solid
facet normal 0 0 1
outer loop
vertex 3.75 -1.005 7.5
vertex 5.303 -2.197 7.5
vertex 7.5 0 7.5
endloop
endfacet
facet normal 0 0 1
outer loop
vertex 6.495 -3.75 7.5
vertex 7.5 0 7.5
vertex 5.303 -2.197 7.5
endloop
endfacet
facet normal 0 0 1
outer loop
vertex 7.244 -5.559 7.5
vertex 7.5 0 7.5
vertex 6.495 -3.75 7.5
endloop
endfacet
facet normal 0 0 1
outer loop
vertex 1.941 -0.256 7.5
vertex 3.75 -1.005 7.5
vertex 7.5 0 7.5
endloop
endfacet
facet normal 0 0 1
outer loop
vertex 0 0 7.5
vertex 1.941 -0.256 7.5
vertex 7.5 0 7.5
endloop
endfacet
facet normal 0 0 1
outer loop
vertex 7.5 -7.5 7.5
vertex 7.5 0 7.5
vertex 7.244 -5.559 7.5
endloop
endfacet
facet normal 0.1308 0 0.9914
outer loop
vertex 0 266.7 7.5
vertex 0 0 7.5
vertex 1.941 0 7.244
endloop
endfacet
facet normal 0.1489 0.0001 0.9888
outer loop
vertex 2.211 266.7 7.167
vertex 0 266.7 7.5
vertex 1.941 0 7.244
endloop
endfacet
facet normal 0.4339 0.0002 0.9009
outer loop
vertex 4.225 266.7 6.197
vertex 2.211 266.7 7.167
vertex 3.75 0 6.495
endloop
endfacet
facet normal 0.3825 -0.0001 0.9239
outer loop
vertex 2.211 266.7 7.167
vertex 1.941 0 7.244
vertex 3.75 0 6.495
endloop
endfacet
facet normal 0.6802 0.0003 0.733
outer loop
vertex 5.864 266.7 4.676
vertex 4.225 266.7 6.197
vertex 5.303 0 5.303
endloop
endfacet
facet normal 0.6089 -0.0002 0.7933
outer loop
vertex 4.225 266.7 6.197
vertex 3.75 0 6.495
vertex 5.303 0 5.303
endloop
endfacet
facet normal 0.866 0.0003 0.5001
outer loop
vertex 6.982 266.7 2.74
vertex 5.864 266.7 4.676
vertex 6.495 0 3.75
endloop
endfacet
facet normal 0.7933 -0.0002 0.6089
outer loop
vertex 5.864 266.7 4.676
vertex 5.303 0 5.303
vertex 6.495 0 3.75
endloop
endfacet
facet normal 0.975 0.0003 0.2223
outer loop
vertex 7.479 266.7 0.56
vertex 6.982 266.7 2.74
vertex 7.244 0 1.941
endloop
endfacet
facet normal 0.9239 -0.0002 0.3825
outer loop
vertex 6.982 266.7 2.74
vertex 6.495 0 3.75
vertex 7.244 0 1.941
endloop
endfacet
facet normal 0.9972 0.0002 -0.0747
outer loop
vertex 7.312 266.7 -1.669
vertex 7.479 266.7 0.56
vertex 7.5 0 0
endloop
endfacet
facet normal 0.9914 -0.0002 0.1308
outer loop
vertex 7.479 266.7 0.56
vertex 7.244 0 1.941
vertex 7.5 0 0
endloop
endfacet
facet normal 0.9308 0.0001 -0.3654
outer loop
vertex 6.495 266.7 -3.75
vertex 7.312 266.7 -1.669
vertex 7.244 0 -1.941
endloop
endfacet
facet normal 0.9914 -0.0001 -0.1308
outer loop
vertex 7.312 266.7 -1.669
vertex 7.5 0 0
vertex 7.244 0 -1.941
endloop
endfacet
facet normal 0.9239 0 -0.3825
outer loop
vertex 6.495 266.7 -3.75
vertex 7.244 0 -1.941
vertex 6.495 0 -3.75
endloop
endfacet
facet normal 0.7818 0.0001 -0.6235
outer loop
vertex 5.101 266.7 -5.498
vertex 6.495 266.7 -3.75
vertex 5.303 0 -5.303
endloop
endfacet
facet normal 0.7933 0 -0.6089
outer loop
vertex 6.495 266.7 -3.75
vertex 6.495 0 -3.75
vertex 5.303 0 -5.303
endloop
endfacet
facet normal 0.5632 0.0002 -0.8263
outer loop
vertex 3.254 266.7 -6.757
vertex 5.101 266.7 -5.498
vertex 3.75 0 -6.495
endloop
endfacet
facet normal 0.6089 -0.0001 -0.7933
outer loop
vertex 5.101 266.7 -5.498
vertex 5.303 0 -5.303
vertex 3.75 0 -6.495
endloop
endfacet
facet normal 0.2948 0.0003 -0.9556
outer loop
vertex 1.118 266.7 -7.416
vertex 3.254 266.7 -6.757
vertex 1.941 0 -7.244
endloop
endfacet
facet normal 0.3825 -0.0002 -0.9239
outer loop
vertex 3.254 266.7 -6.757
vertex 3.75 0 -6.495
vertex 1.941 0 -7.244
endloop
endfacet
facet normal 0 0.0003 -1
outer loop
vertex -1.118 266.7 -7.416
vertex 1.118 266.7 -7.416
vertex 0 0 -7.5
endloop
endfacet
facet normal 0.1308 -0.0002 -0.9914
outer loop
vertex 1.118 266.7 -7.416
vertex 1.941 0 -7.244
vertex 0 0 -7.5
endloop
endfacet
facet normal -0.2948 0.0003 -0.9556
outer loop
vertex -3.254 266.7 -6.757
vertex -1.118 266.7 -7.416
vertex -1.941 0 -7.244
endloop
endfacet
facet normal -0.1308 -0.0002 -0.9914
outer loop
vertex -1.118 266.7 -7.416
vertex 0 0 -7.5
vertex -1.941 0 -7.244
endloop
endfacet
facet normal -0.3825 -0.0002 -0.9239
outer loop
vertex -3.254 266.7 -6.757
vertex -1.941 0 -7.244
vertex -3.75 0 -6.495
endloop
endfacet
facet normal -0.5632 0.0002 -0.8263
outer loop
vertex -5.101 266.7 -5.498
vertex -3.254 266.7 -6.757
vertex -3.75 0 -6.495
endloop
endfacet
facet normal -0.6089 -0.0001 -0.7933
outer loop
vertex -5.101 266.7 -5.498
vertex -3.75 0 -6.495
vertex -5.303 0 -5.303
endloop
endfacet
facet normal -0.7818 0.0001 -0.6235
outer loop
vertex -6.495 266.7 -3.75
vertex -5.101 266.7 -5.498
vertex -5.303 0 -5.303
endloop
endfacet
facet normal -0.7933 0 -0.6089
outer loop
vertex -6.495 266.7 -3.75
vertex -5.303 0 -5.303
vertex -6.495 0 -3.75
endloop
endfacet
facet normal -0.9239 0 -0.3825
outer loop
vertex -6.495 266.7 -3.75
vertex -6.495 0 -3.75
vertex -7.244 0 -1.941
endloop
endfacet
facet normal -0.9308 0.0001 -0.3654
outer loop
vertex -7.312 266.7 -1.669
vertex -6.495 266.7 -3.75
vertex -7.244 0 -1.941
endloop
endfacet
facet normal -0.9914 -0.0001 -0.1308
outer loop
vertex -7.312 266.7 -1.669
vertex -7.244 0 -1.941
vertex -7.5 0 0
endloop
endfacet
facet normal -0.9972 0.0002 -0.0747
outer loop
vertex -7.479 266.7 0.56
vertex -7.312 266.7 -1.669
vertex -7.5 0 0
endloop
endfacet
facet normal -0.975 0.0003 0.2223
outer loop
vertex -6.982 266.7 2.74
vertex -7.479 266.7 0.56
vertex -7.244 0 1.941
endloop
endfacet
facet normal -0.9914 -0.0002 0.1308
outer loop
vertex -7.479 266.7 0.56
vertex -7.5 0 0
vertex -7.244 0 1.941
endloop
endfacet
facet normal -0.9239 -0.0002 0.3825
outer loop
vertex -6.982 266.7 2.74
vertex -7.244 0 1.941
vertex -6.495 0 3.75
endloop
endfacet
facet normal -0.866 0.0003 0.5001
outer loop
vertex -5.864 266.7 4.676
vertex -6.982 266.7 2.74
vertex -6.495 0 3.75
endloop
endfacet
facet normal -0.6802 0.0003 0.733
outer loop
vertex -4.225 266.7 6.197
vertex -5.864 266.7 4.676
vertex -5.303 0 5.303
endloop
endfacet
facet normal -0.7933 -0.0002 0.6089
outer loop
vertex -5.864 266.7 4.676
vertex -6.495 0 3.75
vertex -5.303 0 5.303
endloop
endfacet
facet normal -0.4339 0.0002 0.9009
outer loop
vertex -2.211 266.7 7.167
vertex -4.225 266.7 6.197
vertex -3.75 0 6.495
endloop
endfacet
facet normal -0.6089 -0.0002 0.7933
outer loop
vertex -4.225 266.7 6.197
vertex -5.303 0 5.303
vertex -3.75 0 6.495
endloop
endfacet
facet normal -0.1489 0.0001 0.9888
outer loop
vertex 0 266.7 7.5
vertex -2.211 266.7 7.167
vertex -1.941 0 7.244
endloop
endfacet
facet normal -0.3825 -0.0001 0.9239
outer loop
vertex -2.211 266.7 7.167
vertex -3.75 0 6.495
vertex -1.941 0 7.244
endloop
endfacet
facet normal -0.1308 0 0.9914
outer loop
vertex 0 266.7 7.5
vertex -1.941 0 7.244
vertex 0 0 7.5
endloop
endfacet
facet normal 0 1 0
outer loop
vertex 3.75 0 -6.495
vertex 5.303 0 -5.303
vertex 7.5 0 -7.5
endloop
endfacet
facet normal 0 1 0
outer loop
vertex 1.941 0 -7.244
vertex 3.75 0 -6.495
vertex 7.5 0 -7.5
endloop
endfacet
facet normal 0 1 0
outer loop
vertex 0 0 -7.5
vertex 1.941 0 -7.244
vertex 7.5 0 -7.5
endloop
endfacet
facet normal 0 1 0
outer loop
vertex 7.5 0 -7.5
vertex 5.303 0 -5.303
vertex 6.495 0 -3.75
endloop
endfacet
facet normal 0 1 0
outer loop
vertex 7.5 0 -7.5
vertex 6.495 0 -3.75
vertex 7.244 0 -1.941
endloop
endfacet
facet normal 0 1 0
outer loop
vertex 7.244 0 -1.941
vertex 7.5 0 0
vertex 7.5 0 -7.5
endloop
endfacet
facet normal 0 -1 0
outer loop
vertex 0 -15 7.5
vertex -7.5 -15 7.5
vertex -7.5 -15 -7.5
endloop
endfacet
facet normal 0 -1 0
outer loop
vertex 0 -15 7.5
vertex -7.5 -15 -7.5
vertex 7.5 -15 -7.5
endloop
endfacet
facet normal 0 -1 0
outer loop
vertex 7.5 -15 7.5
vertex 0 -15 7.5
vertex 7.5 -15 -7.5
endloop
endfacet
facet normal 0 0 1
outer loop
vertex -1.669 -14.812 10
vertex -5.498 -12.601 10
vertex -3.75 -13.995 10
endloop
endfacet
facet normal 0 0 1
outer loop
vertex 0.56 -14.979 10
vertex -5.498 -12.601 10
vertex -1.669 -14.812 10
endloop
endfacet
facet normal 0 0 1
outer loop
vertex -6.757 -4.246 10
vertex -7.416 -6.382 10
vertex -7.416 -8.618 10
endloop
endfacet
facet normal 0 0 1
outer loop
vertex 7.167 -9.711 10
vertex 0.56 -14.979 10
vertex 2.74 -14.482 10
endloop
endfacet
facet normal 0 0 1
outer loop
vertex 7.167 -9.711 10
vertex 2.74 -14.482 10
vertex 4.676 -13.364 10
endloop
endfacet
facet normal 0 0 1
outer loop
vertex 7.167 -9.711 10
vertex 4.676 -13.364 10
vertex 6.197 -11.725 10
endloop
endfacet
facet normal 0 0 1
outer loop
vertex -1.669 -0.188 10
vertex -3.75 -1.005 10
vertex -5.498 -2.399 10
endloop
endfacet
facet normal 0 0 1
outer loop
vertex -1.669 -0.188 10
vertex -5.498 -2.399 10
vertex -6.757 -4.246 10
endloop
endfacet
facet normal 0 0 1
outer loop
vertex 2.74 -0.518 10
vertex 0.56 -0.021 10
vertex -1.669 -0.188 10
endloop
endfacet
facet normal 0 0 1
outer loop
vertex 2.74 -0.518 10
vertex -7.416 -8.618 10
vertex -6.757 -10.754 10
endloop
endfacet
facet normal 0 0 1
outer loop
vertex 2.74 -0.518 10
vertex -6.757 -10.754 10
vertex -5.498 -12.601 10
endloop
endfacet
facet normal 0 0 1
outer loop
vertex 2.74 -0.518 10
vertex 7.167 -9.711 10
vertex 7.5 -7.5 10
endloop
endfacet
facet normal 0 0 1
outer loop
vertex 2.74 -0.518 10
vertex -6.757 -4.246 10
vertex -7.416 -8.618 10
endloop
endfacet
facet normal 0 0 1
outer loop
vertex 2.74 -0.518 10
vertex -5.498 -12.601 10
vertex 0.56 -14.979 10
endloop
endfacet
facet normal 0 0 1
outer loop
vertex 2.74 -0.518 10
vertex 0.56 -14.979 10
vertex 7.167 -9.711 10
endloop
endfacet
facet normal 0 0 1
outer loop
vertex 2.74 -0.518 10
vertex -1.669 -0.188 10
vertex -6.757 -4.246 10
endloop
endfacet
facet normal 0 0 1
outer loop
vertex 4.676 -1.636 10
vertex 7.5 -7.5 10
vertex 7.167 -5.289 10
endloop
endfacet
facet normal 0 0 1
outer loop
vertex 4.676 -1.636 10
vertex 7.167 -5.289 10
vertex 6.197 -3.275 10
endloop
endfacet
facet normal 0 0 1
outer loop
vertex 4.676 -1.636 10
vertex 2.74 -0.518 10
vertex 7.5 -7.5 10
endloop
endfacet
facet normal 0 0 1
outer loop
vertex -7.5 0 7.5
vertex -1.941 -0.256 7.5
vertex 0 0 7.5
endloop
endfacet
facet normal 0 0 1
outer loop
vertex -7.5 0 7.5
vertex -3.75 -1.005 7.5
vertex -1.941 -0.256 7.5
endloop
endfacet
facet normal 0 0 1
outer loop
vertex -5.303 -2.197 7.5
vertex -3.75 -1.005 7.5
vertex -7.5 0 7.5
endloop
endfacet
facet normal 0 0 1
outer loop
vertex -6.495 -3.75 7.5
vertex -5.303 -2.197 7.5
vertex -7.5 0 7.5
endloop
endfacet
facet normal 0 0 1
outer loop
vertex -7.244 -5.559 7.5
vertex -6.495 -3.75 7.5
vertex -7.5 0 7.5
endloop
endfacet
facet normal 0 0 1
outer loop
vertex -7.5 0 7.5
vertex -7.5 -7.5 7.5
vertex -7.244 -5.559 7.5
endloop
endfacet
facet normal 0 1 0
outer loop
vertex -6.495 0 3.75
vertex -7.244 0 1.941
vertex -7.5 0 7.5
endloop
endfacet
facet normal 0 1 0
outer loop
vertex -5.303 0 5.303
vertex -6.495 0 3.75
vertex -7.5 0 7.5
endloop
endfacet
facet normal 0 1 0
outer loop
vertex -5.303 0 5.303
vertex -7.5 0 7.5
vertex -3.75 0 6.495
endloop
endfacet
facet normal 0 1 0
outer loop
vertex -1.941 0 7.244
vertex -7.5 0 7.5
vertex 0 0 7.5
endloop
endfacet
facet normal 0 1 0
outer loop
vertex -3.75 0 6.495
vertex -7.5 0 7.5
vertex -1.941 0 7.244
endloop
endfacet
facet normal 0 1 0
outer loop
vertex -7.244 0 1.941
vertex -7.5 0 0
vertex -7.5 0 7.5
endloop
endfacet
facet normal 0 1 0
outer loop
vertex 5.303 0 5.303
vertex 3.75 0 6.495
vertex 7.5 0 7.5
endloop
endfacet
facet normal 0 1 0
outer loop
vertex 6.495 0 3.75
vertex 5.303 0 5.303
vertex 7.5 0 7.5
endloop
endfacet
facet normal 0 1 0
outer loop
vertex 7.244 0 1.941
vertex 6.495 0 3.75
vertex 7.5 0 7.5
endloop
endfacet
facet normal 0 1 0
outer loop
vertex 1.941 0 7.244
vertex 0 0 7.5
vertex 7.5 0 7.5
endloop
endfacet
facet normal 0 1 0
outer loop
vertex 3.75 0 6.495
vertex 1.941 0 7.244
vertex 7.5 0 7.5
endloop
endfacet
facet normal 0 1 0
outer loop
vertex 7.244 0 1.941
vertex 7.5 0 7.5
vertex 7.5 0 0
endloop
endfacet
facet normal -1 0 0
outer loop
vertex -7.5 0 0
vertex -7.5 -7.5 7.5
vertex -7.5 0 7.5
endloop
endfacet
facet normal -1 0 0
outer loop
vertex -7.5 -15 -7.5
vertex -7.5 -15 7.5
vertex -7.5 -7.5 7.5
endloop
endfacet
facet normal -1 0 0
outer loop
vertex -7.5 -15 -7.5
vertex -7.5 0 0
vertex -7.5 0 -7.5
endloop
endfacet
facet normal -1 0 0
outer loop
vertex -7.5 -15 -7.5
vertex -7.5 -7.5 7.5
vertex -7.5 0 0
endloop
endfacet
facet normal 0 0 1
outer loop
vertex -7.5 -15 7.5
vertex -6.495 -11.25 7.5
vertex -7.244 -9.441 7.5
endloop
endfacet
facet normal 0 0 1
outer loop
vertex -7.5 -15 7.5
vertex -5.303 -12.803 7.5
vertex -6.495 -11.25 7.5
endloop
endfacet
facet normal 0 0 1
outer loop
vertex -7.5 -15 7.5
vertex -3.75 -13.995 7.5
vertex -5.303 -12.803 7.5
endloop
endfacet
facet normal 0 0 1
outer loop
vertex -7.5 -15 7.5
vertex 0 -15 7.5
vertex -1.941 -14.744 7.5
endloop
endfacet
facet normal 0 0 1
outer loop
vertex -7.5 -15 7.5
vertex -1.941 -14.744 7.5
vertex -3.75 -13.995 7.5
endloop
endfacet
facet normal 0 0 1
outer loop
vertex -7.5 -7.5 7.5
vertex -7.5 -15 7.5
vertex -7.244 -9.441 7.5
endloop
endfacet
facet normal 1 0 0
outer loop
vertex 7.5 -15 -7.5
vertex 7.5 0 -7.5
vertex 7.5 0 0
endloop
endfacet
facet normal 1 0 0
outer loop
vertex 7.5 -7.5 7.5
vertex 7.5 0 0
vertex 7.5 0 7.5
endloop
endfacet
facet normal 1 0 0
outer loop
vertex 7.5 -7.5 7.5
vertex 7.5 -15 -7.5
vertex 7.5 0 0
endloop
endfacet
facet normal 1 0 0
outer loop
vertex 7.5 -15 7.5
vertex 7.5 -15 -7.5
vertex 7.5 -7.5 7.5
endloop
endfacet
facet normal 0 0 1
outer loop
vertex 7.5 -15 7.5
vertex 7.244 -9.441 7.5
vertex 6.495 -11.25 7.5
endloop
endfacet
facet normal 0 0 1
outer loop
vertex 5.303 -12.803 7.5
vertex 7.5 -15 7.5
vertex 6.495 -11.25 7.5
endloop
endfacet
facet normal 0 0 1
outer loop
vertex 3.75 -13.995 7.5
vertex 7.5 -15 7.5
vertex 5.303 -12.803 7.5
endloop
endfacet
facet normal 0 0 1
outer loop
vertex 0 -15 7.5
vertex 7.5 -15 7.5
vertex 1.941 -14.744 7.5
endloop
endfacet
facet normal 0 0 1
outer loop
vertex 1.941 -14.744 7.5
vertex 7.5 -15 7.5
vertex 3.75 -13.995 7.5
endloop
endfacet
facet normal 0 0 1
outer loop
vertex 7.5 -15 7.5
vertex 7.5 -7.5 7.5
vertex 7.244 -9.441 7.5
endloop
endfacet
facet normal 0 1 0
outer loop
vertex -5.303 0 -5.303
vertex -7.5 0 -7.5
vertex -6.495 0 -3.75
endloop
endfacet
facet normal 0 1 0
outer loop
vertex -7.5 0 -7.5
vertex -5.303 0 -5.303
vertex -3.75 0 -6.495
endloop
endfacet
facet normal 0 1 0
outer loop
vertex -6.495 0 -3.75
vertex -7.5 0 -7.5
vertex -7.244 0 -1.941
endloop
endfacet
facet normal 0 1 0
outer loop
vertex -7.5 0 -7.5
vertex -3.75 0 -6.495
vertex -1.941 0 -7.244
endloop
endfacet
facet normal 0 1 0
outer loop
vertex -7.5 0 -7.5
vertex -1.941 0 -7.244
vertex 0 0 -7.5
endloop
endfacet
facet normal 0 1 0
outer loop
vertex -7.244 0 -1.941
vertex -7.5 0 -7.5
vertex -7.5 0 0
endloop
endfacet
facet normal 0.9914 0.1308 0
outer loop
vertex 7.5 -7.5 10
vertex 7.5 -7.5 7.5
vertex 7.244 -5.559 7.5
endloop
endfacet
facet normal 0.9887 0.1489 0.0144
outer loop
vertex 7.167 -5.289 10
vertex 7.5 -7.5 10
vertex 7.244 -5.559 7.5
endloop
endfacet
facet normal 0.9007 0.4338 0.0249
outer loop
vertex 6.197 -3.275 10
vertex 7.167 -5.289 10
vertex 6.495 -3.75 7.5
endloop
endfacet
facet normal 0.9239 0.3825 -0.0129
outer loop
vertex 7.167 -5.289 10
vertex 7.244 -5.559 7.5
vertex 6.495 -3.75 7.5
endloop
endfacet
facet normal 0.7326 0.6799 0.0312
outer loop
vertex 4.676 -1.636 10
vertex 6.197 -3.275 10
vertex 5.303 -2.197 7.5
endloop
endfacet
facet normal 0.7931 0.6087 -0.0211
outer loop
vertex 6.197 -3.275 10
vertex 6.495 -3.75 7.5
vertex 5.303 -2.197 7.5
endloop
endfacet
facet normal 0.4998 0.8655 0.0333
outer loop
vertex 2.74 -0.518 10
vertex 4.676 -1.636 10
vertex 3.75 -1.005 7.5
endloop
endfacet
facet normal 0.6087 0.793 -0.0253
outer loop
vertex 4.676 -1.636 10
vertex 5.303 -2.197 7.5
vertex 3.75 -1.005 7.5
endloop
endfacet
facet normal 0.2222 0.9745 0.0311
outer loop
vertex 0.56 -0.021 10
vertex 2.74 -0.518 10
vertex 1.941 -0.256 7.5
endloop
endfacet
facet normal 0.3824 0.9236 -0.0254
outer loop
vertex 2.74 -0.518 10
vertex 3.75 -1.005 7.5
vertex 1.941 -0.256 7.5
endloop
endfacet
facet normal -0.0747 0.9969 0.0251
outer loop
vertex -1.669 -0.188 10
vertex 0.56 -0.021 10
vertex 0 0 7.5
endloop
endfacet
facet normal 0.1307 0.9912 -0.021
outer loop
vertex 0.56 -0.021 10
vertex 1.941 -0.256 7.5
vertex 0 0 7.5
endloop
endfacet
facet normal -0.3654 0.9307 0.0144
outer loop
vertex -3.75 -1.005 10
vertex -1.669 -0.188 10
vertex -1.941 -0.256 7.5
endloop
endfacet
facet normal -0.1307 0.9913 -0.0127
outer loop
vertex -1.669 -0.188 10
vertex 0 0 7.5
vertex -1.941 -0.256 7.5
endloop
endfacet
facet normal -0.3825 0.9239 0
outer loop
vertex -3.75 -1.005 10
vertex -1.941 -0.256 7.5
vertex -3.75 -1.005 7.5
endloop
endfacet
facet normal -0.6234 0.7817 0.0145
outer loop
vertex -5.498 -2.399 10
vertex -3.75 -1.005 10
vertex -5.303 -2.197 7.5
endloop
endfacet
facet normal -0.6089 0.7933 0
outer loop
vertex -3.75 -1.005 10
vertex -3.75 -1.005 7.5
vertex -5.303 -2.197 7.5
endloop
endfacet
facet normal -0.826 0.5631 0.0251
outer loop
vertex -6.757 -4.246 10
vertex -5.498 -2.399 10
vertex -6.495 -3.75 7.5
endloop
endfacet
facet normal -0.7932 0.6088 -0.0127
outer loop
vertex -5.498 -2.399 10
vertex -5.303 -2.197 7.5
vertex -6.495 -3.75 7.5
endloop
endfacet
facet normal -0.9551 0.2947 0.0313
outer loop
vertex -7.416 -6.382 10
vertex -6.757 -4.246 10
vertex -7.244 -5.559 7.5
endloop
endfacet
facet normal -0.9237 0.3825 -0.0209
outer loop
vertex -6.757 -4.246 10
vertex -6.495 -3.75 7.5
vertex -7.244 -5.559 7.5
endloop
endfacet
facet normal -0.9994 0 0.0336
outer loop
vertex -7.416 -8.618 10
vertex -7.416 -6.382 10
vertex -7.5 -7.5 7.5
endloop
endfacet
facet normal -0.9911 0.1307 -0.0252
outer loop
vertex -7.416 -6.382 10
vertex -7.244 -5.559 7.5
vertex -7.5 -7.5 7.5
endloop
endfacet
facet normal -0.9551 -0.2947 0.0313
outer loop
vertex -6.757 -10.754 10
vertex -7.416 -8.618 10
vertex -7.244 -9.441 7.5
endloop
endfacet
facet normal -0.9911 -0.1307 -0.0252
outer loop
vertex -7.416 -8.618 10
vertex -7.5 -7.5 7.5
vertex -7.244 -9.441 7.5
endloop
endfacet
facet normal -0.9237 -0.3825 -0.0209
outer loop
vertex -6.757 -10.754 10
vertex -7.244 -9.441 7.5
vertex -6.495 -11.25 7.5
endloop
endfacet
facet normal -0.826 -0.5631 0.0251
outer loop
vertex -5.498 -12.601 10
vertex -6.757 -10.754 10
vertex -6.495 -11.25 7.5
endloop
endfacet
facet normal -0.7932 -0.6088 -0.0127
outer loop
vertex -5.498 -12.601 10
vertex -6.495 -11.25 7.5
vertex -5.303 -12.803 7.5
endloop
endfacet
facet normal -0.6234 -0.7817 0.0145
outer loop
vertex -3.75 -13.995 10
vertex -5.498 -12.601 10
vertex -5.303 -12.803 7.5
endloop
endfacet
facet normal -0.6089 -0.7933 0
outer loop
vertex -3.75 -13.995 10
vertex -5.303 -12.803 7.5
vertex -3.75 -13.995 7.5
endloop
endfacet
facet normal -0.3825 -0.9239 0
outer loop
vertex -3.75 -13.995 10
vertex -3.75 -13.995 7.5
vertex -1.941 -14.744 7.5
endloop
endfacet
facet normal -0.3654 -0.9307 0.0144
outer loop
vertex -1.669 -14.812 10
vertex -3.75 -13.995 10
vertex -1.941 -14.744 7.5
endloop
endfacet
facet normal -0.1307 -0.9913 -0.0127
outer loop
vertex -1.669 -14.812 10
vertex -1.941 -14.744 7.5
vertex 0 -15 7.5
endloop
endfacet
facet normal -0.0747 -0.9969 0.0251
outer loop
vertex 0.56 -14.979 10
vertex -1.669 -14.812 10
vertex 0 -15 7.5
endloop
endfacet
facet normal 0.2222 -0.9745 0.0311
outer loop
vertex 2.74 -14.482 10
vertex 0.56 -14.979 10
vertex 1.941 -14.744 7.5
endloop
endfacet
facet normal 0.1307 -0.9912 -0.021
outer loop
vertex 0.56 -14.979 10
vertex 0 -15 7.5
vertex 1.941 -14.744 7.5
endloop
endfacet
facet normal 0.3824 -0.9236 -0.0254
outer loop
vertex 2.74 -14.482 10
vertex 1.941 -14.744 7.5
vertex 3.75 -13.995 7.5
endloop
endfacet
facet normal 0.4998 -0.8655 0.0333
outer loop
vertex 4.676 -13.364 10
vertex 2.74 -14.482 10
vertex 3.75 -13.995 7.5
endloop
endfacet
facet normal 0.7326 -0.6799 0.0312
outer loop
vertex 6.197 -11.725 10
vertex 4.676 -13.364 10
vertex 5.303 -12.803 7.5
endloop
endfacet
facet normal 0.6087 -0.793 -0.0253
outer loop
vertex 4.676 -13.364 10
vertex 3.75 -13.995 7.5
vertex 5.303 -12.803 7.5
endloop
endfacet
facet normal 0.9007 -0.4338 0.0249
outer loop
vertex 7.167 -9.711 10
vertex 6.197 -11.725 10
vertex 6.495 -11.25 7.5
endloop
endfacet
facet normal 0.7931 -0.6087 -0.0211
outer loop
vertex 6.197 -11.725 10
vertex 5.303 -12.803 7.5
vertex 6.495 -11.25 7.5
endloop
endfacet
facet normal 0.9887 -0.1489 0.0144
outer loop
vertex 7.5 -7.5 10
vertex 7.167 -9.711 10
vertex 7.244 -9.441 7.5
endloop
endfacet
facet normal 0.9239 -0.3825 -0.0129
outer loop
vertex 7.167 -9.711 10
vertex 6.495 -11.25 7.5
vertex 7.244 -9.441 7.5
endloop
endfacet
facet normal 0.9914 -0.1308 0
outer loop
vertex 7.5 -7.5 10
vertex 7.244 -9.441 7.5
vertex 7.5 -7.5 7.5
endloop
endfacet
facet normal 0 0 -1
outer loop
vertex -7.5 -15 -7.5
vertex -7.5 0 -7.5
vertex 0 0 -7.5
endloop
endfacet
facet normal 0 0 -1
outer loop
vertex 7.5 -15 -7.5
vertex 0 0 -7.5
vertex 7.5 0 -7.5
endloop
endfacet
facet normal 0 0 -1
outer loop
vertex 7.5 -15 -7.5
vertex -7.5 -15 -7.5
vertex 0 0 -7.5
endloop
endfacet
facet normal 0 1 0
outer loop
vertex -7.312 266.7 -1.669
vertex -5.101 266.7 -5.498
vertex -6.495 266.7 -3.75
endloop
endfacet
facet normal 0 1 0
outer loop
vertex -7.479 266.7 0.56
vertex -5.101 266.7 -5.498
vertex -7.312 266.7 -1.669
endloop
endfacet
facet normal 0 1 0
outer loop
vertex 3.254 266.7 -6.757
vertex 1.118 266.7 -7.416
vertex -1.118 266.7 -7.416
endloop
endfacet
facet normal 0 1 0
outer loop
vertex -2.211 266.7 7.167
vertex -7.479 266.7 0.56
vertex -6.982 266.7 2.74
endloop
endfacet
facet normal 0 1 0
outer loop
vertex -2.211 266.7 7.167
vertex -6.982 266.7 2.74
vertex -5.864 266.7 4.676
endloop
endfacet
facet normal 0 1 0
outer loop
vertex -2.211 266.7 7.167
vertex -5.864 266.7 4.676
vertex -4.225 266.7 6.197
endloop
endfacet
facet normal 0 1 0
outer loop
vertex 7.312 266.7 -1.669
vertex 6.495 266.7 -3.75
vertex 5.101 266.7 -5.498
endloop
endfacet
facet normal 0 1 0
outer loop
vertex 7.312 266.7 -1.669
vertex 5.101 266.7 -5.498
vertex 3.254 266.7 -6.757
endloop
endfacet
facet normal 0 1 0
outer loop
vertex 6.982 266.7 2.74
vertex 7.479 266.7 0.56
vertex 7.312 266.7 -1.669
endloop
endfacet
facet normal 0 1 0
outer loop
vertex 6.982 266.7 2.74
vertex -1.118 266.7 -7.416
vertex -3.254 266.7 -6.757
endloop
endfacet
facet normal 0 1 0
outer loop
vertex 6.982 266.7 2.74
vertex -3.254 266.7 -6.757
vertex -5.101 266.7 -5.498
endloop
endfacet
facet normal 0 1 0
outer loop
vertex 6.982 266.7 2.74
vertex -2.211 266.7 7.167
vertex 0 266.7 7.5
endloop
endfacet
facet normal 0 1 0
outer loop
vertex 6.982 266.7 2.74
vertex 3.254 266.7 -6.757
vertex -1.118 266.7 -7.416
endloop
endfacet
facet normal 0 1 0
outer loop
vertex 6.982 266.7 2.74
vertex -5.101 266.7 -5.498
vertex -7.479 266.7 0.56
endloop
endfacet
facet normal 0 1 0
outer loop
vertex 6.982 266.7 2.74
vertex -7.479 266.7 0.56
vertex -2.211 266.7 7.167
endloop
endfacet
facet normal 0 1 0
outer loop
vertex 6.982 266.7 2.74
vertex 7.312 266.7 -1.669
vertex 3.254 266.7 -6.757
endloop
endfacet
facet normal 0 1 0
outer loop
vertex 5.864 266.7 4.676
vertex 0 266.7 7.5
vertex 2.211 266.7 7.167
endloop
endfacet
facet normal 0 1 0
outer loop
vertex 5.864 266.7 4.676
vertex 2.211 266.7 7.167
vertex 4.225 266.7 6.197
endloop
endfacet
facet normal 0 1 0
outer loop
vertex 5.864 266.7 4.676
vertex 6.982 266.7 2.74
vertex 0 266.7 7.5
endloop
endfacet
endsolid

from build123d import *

# Parameters (mm, degrees)
SKETCH1_R           = 7.5
BOSS_EXTRUDE1_DEPTH = 266.7
BOSS_EXTRUDE2_START = 15
SKETCH2_R           = 7.5
BOSS_EXTRUDE2_DEPTH = 15
SKETCH3_R           = 7.5
BOSS_EXTRUDE3_DEPTH = 2.5


with BuildPart() as part:
    # Sketch1 → Boss-Extrude1 (new body)
    with BuildSketch(Plane(origin=(0, 0, 0), x_dir=(1, 0, 0), z_dir=(0, 1, 0))):
        with Locations(Location((0, 0, 0), (0, 0, 270))):
            Circle(SKETCH1_R)
    extrude(amount=BOSS_EXTRUDE1_DEPTH)

    # Sketch2 → Boss-Extrude2 (add)
    with BuildSketch(Plane.XZ.offset(BOSS_EXTRUDE2_START)):
        with BuildLine():
            Line((0, 7.5), (-7.5, 7.5))
            Line((-7.5, 7.5), (-7.5, 0))
            ThreePointArc((-7.5, 0), (-5.303300859, 5.303300859), (0, 7.5))
        make_face()
        with Locations(Location((0, 0, 0), (0, 0, 90))):
            Circle(SKETCH2_R)
        with BuildLine():
            Line((7.5, 7.5), (0, 7.5))
            ThreePointArc((0, 7.5), (5.303300859, 5.303300859), (7.5, 0))
            Line((7.5, 0), (7.5, 7.5))
        make_face()
        with BuildLine():
            Line((7.5, -7.5), (7.5, 0))
            ThreePointArc((7.5, 0), (5.303300859, -5.303300859), (0, -7.5))
            Line((0, -7.5), (7.5, -7.5))
        make_face()
        with BuildLine():
            ThreePointArc((0, -7.5), (-5.303300859, -5.303300859), (-7.5, 0))
            Line((-7.5, 0), (-7.5, -7.5))
            Line((-7.5, -7.5), (0, -7.5))
        make_face()
    extrude(amount=-BOSS_EXTRUDE2_DEPTH)

    # Sketch3 → Boss-Extrude3 (add)
    with BuildSketch(Plane.XY.offset(7.5)):
        with Locations((0, -7.5)):
            Circle(SKETCH3_R)
    extrude(amount=BOSS_EXTRUDE3_DEPTH)


solid = part.part
